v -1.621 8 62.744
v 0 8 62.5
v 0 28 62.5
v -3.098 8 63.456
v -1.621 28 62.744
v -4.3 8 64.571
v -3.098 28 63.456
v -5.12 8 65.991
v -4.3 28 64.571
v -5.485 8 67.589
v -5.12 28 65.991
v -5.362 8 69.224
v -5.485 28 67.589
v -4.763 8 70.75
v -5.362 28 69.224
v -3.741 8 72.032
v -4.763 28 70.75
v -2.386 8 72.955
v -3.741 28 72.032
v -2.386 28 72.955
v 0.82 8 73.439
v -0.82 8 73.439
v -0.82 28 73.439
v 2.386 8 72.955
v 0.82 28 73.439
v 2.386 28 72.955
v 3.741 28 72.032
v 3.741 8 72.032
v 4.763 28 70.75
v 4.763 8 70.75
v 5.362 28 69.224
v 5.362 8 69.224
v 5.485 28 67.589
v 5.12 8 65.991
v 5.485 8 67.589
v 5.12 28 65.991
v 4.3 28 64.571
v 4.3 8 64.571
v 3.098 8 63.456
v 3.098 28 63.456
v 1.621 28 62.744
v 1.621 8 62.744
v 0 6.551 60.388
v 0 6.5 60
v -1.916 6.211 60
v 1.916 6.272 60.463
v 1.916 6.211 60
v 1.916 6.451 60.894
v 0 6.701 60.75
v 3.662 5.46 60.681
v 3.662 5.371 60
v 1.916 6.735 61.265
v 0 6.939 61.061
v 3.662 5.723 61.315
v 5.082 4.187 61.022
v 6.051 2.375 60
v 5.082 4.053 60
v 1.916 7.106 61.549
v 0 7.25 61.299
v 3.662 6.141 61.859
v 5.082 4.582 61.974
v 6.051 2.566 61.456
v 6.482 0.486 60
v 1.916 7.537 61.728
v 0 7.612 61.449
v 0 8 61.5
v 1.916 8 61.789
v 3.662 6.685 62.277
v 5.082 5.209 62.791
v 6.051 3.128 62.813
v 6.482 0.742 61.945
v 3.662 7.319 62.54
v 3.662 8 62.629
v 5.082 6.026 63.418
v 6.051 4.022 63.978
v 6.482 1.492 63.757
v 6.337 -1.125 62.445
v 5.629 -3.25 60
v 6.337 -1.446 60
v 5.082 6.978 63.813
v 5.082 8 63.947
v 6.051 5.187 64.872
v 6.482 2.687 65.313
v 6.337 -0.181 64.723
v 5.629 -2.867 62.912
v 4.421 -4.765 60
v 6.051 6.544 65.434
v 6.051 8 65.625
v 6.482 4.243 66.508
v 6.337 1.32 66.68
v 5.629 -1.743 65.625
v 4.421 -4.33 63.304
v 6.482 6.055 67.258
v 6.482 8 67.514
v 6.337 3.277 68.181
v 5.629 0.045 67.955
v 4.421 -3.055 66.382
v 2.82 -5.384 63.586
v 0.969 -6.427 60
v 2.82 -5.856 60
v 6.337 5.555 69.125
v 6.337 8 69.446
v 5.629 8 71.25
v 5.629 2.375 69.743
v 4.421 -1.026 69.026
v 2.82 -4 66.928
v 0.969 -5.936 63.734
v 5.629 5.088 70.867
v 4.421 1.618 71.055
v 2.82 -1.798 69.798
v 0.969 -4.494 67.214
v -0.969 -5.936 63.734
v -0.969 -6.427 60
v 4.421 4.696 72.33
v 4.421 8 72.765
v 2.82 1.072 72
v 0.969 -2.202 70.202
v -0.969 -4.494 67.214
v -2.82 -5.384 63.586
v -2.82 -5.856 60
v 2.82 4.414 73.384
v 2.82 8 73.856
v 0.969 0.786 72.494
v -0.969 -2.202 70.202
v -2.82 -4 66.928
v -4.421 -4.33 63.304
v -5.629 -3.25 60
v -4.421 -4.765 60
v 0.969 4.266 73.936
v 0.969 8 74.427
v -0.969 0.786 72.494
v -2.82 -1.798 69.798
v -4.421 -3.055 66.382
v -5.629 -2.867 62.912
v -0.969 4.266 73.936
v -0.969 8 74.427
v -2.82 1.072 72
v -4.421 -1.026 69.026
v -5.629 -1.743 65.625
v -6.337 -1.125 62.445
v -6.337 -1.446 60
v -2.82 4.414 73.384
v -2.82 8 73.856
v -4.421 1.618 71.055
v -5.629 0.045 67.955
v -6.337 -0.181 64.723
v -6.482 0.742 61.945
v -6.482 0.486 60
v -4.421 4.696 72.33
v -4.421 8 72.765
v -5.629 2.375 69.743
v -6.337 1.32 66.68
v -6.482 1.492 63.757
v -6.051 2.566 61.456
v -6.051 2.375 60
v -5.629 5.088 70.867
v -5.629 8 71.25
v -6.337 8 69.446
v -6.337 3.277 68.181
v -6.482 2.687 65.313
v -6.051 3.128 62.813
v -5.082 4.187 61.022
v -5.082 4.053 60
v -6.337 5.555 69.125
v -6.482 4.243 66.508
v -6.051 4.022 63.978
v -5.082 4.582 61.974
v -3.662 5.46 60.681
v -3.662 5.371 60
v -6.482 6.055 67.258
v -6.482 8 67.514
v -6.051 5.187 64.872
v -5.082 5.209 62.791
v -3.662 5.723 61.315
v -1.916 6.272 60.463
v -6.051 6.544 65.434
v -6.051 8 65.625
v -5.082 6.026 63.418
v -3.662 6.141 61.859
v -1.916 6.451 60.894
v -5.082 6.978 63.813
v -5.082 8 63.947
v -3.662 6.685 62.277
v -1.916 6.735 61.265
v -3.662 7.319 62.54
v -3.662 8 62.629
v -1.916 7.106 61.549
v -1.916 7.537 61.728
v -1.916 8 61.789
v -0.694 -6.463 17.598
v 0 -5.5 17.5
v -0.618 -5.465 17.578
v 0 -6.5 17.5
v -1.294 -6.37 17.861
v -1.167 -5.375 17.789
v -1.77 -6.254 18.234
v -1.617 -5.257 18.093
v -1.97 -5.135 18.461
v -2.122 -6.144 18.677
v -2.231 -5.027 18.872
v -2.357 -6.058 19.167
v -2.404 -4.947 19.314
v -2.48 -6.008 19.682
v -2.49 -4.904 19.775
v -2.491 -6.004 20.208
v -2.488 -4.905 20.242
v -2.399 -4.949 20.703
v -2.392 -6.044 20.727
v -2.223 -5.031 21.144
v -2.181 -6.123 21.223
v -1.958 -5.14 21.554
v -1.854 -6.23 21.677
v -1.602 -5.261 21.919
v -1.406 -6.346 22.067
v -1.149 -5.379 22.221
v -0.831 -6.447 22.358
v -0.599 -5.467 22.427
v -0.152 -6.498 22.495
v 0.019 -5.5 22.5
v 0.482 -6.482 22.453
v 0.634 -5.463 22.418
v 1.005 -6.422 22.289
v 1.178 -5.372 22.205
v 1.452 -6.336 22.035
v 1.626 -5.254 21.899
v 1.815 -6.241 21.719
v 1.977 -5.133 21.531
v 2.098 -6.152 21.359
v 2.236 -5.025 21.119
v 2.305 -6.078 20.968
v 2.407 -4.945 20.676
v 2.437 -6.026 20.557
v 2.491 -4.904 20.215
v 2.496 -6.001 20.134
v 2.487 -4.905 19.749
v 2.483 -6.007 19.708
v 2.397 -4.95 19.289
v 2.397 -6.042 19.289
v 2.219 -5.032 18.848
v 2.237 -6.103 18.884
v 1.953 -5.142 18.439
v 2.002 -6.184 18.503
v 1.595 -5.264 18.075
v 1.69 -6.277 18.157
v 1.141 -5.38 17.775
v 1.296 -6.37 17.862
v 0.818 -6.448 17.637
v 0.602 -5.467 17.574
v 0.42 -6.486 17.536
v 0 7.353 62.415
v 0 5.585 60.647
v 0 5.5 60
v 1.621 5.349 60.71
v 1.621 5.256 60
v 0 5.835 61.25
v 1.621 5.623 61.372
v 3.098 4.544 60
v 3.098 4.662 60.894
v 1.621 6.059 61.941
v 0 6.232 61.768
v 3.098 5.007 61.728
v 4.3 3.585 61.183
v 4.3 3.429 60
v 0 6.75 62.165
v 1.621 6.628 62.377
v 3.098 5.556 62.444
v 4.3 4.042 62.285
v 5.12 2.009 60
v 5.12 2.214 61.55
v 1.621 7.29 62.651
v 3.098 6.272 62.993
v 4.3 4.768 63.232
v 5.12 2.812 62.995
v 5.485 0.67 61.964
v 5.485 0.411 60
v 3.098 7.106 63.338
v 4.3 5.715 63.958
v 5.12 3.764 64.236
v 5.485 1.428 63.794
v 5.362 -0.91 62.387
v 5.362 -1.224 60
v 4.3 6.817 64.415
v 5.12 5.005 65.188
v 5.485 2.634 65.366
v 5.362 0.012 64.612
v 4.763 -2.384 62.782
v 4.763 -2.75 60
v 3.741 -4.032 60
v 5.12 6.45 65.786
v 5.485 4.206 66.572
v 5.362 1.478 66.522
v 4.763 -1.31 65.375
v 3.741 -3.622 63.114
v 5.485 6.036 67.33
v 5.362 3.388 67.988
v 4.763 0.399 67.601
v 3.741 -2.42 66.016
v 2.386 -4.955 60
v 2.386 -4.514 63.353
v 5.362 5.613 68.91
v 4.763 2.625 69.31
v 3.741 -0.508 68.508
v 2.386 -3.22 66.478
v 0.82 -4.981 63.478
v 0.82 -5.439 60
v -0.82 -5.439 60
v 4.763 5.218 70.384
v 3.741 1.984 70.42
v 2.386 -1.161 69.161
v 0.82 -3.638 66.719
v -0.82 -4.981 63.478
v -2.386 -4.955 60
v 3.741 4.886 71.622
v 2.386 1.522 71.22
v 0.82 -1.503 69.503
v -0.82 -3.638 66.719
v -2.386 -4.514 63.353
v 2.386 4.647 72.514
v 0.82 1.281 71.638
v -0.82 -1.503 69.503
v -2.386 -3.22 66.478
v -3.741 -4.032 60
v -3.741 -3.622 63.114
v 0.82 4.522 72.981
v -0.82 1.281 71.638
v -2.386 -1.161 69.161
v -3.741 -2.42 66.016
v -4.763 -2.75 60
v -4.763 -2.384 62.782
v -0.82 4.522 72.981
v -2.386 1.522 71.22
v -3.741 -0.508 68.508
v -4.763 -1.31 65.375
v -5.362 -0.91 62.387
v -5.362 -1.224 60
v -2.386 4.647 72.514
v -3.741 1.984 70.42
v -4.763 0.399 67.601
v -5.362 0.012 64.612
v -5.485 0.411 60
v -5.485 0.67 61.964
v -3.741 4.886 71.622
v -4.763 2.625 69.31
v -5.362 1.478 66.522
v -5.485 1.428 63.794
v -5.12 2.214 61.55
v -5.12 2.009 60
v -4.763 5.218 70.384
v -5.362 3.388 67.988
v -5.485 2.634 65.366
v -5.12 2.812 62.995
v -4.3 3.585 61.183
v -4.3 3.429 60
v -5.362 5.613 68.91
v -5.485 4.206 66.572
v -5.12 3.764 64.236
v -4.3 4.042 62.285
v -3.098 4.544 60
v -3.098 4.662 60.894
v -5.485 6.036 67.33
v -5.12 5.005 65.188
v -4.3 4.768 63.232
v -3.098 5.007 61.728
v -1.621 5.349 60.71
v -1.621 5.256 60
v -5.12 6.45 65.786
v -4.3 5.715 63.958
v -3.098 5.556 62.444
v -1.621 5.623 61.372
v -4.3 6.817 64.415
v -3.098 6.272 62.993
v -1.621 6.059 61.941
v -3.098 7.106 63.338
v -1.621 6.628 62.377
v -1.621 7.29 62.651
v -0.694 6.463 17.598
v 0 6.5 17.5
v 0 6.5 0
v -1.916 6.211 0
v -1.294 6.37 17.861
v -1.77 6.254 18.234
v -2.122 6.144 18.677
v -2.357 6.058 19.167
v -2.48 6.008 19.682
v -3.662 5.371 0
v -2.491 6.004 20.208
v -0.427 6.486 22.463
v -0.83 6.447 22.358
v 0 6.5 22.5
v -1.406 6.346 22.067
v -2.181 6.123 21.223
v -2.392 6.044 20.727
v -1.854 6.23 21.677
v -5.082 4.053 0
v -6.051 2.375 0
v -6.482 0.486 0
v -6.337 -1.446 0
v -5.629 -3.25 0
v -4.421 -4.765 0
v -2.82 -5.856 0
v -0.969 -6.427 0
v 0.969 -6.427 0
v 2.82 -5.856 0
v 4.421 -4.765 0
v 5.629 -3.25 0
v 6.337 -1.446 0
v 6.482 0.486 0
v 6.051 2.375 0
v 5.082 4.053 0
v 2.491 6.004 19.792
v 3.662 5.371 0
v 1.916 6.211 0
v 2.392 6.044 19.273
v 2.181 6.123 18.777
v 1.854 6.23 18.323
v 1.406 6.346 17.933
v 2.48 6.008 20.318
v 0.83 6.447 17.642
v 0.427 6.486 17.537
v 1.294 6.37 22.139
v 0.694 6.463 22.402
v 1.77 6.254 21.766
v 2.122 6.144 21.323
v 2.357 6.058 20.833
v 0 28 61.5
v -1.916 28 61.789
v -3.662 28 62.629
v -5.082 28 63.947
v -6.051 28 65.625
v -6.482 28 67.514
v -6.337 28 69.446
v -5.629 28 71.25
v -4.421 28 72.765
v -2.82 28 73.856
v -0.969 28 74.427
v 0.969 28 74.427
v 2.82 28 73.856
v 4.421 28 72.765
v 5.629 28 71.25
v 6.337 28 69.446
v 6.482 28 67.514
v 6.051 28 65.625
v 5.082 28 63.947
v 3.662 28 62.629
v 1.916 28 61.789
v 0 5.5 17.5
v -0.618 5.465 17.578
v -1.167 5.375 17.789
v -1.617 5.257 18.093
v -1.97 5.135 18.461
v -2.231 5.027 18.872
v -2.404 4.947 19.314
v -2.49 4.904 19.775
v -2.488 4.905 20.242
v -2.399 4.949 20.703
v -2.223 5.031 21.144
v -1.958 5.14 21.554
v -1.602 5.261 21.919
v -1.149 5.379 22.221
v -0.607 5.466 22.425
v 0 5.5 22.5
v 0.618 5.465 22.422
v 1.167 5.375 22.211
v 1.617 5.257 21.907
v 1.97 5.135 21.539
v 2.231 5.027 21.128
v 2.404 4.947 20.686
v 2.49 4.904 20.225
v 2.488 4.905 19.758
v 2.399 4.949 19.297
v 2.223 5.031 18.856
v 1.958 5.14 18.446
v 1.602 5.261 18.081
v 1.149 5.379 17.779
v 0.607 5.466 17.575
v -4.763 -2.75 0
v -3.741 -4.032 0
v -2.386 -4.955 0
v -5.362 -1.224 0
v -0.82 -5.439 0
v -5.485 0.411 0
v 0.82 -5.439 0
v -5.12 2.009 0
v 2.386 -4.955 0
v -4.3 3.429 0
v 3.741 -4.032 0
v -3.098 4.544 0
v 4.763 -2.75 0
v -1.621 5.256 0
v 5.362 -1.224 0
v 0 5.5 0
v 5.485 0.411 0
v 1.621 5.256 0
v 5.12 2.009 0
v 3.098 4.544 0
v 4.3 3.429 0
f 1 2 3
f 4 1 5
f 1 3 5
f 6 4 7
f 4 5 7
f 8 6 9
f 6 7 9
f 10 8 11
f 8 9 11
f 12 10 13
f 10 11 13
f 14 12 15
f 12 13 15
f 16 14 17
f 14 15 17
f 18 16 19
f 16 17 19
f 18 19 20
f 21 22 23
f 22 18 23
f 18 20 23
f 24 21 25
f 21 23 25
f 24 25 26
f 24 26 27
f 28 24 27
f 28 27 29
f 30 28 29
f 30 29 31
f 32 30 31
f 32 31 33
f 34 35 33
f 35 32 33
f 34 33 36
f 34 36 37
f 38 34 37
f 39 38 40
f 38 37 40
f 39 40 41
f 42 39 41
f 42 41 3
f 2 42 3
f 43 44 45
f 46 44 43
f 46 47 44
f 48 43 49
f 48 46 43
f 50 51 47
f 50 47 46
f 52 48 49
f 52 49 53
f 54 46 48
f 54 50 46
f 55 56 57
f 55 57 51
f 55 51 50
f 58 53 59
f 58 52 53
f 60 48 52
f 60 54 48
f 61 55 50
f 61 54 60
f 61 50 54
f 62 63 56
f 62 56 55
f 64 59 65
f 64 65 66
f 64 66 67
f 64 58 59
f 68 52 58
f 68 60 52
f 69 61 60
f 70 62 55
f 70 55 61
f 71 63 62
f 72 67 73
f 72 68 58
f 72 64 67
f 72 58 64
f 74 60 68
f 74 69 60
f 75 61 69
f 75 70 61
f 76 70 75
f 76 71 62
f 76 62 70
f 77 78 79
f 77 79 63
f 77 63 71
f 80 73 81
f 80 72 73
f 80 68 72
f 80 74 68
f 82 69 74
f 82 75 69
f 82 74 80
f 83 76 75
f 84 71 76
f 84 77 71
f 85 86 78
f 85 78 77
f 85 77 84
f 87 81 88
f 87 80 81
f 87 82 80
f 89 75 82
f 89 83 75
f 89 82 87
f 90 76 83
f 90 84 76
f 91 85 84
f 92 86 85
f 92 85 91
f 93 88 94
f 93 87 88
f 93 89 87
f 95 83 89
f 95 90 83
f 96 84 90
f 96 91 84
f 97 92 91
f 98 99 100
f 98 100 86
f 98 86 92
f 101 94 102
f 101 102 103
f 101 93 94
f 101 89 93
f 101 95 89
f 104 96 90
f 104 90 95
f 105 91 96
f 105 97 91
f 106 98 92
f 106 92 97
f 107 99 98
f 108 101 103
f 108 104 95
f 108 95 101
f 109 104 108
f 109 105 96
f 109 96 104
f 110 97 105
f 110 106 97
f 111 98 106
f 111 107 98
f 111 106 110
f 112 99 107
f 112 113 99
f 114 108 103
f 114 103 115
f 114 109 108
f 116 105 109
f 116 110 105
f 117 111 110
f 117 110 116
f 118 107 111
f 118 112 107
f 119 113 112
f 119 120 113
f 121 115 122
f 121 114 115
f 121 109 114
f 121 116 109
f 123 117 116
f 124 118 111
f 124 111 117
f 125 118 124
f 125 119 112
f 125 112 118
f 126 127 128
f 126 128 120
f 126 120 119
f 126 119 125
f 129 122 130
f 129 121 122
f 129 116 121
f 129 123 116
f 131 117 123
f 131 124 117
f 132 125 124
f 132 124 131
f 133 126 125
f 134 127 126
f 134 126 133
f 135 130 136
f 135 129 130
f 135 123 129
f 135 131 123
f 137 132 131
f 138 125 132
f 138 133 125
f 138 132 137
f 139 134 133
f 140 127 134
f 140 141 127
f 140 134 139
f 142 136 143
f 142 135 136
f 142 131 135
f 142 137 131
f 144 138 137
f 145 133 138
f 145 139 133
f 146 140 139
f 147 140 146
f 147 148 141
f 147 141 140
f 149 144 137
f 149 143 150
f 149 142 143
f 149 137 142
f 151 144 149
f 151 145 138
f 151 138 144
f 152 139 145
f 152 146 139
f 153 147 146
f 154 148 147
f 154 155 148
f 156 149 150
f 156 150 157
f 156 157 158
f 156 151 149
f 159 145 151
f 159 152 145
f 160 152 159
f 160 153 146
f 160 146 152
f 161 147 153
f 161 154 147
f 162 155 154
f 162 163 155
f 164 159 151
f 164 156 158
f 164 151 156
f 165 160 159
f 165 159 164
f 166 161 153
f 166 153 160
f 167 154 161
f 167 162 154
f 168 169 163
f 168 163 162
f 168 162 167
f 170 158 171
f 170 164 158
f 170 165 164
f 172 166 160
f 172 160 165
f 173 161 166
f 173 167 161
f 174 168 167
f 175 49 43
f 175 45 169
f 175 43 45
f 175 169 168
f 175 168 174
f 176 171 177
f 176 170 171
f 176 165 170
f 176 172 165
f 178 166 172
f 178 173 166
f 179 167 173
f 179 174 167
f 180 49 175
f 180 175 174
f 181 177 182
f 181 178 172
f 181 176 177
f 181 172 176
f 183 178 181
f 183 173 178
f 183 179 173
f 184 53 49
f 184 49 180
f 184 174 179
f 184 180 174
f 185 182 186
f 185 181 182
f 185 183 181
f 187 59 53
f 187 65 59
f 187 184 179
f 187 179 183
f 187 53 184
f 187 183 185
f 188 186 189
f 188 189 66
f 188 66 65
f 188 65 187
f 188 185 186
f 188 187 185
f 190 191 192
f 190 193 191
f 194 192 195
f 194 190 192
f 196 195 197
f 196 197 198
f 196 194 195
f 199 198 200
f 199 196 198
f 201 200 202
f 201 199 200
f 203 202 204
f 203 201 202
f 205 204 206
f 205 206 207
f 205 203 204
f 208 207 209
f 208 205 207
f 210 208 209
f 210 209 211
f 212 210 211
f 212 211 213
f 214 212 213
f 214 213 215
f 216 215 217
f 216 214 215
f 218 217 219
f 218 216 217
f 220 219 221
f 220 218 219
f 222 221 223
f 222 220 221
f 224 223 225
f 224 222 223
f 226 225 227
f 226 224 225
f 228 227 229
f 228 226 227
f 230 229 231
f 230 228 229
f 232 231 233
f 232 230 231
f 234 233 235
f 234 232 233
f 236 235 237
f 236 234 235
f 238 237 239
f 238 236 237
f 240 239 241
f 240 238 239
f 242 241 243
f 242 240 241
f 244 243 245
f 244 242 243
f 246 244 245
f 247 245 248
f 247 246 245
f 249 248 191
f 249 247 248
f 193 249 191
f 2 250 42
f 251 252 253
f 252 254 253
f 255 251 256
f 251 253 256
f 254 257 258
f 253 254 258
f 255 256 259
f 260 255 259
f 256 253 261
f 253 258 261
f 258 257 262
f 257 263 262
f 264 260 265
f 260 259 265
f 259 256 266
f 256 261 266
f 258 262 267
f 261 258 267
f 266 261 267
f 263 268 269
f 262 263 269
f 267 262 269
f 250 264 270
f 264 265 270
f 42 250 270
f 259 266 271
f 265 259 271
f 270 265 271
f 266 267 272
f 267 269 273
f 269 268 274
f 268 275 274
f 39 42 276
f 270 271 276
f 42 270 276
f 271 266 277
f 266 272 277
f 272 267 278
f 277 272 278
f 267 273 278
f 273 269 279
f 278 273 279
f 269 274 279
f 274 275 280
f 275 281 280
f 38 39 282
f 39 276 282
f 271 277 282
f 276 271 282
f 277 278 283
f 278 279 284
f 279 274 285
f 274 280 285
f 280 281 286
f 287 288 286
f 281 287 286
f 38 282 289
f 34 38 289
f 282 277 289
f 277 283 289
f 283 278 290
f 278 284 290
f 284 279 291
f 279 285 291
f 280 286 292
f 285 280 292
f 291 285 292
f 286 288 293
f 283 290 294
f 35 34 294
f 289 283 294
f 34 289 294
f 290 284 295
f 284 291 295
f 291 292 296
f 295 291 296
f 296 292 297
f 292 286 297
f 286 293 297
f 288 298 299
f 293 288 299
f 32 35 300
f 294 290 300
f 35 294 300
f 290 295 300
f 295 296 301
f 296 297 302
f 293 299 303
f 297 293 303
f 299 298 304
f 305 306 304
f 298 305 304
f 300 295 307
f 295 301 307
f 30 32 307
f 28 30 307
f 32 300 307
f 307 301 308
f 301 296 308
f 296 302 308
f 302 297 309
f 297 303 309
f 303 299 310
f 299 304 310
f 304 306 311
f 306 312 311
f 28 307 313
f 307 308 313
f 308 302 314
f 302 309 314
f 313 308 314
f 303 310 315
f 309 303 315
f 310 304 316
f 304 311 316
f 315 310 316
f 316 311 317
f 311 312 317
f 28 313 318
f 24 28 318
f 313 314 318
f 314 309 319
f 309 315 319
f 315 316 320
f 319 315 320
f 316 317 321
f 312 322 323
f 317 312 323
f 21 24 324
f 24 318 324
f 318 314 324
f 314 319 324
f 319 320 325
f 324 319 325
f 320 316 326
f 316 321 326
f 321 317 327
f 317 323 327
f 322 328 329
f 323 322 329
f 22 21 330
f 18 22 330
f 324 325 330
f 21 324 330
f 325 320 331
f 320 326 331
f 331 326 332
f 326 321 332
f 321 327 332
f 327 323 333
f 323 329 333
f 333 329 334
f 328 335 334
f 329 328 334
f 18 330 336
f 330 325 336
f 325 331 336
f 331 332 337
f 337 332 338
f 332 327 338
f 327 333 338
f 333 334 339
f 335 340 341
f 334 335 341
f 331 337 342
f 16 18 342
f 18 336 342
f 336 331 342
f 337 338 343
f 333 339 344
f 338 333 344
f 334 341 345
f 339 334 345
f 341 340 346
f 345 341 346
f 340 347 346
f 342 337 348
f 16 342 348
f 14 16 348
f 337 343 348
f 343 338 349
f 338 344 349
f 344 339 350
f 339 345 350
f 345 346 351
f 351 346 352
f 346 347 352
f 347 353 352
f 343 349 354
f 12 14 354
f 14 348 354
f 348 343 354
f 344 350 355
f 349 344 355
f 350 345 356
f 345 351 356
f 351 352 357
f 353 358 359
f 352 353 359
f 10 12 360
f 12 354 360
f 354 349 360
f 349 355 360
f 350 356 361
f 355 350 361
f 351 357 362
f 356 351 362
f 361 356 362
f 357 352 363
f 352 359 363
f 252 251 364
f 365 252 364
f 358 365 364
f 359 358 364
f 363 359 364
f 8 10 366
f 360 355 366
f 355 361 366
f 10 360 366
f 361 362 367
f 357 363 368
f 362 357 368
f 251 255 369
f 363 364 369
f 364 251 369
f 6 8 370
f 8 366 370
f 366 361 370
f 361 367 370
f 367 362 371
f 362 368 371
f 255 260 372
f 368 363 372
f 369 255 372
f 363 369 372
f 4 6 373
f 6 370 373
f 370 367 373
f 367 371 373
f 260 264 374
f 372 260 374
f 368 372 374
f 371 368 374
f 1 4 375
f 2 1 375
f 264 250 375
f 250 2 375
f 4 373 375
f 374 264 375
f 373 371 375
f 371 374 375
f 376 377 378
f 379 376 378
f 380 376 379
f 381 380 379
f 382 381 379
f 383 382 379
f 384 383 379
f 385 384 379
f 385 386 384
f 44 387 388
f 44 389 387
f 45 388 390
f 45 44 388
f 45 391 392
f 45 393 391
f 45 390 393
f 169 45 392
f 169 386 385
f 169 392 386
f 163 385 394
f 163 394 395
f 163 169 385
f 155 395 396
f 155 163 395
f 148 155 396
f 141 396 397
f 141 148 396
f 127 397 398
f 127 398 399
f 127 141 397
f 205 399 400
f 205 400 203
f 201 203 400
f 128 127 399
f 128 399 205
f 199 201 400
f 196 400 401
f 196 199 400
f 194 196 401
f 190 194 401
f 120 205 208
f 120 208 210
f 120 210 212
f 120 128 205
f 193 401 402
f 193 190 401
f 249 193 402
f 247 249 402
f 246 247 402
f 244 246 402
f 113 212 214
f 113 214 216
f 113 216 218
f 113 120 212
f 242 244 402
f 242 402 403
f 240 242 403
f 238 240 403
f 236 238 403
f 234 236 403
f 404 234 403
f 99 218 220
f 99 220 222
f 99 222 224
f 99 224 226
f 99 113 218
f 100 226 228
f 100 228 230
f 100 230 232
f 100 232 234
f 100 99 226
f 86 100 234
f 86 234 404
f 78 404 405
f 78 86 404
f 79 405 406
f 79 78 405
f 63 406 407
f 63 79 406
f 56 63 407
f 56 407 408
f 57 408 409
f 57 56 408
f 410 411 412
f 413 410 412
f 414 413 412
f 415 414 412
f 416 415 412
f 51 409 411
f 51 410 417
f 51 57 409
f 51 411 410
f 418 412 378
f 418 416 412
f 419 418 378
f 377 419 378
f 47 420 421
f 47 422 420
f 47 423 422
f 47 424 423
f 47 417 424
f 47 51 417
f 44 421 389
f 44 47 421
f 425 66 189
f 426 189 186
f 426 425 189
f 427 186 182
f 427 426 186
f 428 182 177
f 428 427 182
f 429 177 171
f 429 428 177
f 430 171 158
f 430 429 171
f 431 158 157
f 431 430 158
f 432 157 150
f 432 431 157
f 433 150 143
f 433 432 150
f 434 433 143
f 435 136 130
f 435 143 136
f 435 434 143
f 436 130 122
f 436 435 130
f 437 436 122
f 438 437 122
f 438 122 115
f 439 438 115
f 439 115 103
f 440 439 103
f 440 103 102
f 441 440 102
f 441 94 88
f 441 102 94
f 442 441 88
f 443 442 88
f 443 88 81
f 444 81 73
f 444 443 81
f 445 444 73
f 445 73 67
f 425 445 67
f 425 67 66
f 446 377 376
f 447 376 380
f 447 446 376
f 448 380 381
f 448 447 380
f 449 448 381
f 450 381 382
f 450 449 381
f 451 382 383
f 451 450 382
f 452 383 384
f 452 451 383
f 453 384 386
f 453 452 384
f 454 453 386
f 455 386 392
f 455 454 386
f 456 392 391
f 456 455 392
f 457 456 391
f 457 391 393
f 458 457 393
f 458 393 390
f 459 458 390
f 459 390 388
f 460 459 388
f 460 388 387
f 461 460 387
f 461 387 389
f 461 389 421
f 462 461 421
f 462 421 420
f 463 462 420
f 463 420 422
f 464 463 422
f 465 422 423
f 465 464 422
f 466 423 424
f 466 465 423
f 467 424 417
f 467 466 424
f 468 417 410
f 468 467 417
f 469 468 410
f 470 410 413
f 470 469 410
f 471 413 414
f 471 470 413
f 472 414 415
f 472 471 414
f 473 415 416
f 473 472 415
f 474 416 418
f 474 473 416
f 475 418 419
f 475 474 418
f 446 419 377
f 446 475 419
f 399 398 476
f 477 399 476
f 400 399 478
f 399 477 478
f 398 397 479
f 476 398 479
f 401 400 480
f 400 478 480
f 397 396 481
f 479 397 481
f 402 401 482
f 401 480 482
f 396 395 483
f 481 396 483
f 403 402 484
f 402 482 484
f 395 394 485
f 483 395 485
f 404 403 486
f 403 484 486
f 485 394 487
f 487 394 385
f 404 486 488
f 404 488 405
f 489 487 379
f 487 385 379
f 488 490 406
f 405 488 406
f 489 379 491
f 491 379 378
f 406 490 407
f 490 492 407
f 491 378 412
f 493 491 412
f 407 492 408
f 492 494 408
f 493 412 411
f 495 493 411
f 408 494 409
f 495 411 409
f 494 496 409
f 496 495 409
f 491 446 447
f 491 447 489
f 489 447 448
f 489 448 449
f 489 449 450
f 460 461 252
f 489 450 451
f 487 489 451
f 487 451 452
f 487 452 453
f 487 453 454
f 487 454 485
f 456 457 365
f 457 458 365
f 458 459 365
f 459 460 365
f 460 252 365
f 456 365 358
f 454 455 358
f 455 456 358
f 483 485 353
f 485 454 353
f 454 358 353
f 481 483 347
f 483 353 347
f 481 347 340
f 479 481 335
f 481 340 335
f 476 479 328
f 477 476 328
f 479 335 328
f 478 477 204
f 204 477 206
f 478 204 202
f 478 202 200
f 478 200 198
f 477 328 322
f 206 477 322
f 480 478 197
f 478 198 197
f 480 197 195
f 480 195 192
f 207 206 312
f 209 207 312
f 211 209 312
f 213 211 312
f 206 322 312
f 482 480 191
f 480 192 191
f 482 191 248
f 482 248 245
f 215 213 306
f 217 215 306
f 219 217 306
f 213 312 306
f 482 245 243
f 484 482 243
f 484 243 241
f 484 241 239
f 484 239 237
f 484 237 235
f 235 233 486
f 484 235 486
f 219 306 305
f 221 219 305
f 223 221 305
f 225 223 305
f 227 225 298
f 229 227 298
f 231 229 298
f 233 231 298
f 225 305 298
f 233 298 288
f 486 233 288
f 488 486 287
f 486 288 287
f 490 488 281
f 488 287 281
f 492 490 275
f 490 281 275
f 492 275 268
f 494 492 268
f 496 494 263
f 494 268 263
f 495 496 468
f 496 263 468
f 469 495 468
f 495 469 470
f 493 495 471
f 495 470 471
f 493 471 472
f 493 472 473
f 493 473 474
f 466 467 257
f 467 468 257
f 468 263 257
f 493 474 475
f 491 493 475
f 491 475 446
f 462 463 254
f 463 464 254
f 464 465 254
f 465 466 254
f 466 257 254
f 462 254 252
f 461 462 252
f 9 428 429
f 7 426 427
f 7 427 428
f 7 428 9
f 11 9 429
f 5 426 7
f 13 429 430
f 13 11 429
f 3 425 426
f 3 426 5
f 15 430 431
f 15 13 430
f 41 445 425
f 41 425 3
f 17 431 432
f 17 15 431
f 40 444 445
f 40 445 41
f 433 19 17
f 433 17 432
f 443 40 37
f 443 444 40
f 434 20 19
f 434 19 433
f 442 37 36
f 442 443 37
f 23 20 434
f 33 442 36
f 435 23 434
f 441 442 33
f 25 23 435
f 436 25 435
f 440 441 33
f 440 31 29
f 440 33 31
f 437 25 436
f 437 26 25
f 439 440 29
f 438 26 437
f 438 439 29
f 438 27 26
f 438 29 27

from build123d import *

# Parameters (mm, degrees)
SWEEP5_PROFILE_R        = 6.5
CUT_SWEEP1_PROFILE_R    = 5.5
CUT_EXTRUDE1_DEPTH      = 80.852990027
CUT_EXTRUDE1_DEPTH_BACK = 80.852990027
SKETCH30_R              = 2.5


with BuildPart() as part:
    # Sweep5: sweep along a path in Sketch2
    with BuildLine(Plane(origin=(0, 0, 0), x_dir=(0, 0, -1), z_dir=(1, 0, 0))) as sweep5_path:
        Line((0, 0), (-60, 0))
        ThreePointArc((-60, 0), (-65.656854249, 2.343145751), (-68, 8))
        Line((-68, 8), (-68, 28))
    # Sweep5 profile (on start of the path) → Sweep5 (sweep)
    with BuildSketch(Plane(origin=(0, 0, 0), x_dir=(0, 1, 0), z_dir=(0, 0, 1))):
        Circle(SWEEP5_PROFILE_R)
    sweep(path=sweep5_path.line)

    # Cut-Sweep1: sweep along a path in Sketch2<2>
    with BuildLine(Plane(origin=(0, 0, 0), x_dir=(0, 0, -1), z_dir=(1, 0, 0))) as cut_sweep1_path:
        Line((0, 0), (-60, 0))
        ThreePointArc((-60, 0), (-65.656854249, 2.343145751), (-68, 8))
        Line((-68, 8), (-68, 28))
    # Cut-Sweep1 profile (on start of the path) → Cut-Sweep1 (sweep, cut)
    with BuildSketch(Plane(origin=(0, 0, 0), x_dir=(0, 1, 0), z_dir=(0, 0, 1))):
        Circle(CUT_SWEEP1_PROFILE_R)
    sweep(path=cut_sweep1_path.line, mode=Mode.SUBTRACT)

    # Sketch30 → Cut-Extrude1 (cut, two sides: drawn at the far end of the back side and taken through both)
    with BuildSketch(Plane(origin=(0, 0, 0), x_dir=(1, 0, 0), z_dir=(0, 1, 0)).offset(-CUT_EXTRUDE1_DEPTH_BACK)):
        with Locations((0, -20)):
            Circle(SKETCH30_R)
    extrude(amount=CUT_EXTRUDE1_DEPTH + CUT_EXTRUDE1_DEPTH_BACK, mode=Mode.SUBTRACT)


solid = part.part
